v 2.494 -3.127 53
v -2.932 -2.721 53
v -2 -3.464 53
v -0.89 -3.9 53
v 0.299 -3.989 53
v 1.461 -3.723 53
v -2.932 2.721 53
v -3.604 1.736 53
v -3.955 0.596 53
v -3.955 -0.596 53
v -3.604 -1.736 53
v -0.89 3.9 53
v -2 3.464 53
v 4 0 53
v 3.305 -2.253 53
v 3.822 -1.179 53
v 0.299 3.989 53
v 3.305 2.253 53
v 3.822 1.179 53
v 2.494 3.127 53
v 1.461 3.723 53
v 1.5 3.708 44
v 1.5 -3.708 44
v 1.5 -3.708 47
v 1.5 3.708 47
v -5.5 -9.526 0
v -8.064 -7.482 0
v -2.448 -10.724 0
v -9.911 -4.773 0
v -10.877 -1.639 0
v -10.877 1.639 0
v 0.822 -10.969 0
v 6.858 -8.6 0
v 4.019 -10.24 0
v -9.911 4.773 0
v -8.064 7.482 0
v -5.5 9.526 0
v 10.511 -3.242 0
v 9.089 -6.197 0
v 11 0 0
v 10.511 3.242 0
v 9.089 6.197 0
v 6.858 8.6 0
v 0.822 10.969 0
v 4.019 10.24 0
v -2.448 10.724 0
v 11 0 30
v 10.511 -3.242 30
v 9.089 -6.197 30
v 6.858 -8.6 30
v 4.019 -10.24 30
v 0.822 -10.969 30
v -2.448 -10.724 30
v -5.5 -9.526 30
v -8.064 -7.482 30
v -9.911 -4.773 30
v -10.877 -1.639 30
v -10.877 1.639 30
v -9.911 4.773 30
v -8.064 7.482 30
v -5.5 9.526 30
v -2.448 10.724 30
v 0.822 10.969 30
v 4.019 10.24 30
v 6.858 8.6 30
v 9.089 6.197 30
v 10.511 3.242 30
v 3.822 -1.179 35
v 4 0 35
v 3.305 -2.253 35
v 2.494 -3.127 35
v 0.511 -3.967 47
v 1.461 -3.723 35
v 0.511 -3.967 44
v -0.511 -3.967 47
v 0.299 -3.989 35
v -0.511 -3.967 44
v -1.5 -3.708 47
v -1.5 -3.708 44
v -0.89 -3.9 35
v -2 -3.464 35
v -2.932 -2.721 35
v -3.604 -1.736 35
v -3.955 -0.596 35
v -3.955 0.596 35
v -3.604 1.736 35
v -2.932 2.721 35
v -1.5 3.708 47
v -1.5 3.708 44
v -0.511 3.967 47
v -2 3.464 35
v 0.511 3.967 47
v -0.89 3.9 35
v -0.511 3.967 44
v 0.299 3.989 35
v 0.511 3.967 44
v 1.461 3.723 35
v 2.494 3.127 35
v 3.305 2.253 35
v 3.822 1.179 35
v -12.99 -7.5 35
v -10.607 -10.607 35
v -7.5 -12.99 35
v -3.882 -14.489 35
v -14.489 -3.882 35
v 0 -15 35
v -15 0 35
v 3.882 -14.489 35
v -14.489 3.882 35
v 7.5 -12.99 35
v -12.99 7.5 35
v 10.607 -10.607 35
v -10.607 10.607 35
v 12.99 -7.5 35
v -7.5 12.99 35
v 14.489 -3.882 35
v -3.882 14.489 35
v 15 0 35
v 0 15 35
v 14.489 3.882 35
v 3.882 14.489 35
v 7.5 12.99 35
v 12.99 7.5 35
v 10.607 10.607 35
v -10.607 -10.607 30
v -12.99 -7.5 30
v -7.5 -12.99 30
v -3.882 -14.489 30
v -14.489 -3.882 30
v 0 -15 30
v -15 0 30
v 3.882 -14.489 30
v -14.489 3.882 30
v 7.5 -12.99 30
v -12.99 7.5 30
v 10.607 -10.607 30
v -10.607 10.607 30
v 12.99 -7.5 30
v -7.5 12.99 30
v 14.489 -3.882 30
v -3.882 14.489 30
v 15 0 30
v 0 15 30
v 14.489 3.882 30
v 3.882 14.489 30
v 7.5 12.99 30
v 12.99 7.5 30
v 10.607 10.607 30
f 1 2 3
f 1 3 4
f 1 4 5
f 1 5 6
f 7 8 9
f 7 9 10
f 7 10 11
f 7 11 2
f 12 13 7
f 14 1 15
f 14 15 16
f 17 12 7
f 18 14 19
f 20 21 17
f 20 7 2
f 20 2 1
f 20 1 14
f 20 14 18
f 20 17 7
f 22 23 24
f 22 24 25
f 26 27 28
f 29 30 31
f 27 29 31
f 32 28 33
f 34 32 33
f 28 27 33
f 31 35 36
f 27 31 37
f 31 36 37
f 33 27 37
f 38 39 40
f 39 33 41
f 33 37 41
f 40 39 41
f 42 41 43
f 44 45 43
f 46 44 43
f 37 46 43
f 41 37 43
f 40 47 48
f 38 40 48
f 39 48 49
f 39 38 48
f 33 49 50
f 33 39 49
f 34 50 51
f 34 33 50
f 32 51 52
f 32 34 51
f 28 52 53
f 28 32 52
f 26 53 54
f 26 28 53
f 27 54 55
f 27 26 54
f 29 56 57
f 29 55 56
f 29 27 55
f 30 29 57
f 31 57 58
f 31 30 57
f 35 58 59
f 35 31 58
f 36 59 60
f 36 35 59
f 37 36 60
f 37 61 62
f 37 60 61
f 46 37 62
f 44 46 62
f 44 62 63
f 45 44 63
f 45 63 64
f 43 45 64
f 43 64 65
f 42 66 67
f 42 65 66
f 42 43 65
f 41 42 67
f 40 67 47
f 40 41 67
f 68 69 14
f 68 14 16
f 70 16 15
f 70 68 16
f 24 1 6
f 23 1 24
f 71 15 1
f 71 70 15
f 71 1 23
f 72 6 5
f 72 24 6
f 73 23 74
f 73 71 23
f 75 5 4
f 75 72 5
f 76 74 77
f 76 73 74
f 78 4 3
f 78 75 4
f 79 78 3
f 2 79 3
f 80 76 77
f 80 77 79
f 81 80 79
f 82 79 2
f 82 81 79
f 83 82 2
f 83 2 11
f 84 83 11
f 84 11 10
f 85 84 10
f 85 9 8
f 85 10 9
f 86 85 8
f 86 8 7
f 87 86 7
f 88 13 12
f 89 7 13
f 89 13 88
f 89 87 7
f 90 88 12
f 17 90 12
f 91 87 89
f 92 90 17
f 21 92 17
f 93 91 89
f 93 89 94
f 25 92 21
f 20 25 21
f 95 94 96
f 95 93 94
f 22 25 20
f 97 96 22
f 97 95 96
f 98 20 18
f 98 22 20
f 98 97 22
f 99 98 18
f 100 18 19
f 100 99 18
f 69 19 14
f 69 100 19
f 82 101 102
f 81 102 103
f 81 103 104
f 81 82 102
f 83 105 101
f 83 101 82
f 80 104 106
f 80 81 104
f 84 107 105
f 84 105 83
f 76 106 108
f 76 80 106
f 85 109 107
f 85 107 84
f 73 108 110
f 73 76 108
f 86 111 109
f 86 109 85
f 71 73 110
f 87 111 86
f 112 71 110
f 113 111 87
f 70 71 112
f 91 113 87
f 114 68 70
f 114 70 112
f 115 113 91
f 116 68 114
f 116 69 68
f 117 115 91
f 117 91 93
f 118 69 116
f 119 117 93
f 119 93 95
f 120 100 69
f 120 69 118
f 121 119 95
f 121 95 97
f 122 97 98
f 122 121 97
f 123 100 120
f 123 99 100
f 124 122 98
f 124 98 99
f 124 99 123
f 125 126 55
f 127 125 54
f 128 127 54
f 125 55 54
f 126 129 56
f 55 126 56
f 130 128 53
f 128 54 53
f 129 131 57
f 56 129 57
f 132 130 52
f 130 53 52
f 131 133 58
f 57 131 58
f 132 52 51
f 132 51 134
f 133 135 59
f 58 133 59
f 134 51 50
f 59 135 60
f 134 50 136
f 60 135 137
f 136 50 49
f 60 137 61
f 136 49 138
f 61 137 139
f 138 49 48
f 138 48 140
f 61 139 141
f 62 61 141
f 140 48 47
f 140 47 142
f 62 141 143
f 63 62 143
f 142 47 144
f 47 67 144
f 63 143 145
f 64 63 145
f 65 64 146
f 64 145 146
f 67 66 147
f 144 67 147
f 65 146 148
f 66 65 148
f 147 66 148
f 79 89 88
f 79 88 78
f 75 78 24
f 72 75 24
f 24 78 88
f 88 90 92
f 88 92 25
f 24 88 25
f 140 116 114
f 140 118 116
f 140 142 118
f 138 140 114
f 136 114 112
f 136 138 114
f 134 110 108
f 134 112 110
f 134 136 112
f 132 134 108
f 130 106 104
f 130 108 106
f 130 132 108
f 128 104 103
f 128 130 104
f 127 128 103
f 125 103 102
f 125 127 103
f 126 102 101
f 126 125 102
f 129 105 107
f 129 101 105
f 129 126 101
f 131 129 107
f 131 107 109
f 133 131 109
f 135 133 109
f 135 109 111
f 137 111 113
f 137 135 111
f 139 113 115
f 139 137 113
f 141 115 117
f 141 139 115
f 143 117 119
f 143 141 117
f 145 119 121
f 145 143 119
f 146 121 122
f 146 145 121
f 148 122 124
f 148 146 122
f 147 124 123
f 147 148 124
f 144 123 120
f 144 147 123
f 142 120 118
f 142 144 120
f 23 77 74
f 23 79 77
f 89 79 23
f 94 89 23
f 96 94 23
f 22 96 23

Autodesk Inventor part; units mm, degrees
ref_plane "YZ Plane" through (0, 0, 0) normal (1, 0, 0) x (0, 1, 0)
ref_plane "XZ Plane" through (0, 0, 0) normal (0, 1, 0) x (-1, 0, 0)
ref_plane "XY Plane" through (0, 0, 0) normal (0, 0, 1) x (1, 0, 0)
sketch "Sketch1" plane through (0, 0, 0) normal (0, 0, 1) x (1, 0, 0)
  circle A0 centre (0, 0) radius 11
  dimension "d0" = 22
extrude "Extrusion1" add sketch "Sketch1" along normal blind 30
sketch "Sketch2" plane through (0, 0, 30) normal (0, 0, 1) x (1, 0, 0)
  circle A0 centre (0, 0) radius 11 projected
  circle A1 centre (0, 0) radius 15
  dimension "d3" = 30
extrude "Extrusion2" add sketch "Sketch2" along normal blind 5 contours A0 | A1
sketch "Sketch6" plane through (0, 0, 35) normal (0, 0, 1) x (1, 0, 0)
  circle A0 centre (0, 0) radius 4
  dimension "d20" = 8
extrude "Extrusion6" add sketch "Sketch6" along normal blind 18
ref_plane "Work Plane1" through (0, 0, 44) normal (0, 0, 1) x (1, 0, 0)
sketch "Sketch7" plane through (0, 0, 44) normal (0, 0, 1) x (1, 0, 0)
  line L0 (1.5, 4) -> (-1.5, 4)
  line L1 (-1.5, 4) -> (-1.5, -4)
  line L2 (-1.5, -4) -> (1.5, -4)
  line L3 (1.5, -4) -> (1.5, 4)
  line L4 (1.5, 4) -> (-1.5, -4) construction
  line L5 (-1.5, 4) -> (1.5, -4) construction
  point P0 (0, 0)
  dimension "d16" = 3
  dimension "d17" = 8
extrude "Extrusion7" cut sketch "Sketch7" along normal blind 3
properties part number "ClickHolder"
